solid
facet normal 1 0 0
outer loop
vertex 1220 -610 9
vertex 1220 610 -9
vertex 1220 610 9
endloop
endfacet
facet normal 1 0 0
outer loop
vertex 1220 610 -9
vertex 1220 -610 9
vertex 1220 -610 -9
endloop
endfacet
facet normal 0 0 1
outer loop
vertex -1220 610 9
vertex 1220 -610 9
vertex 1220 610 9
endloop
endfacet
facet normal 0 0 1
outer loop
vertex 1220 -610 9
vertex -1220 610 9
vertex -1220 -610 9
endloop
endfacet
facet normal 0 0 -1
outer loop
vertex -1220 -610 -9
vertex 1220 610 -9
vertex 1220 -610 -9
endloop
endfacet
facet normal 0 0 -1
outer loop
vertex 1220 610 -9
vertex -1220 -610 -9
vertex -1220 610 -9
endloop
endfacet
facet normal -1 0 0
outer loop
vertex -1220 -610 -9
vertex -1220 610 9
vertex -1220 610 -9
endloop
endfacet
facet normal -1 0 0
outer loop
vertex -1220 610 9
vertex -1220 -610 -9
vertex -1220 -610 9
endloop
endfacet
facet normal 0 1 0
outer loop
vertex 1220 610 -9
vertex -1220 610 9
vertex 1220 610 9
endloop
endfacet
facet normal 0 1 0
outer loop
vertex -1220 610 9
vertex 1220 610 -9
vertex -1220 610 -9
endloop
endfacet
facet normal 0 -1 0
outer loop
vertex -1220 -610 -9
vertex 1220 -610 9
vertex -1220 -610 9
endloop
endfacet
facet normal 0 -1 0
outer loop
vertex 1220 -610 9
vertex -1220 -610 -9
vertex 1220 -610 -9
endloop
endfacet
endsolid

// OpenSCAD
// Parameters
sheet_L = 2440; //[1220:4880:1]
sheet_W = 1220; //[610:2440:1]
sheet_T = 18; //[9:36:1]
chamfer_size = 10; //[5:20:1]
roundover_r = 3; //[1:8:1]
connect_overlap = 1; //[0.5:2:0.5]

// Base Shapes
module mdf_sheet() {
  color([0.85, 0.85, 0.8]) // MDF color
  cube([sheet_L, sheet_W, sheet_T], center=true);
}

module corner_chamfer_cut(position) {
  rotate([0, 0, 45])
  translate(position)
  cube([chamfer_size*2, chamfer_size*2, sheet_T + connect_overlap*2], center=true);
}

module edge_roundover_sphere() {
  sphere(r=roundover_r);
}

// Operations
module corner_chamfers() {
  difference() {
    mdf_sheet();
    corner_chamfer_cut([sheet_L/2 - chamfer_size, sheet_W/2 - chamfer_size, 0]);
    corner_chamfer_cut([-sheet_L/2 + chamfer_size, sheet_W/2 - chamfer_size, 0]);
    corner_chamfer_cut([sheet_L/2 - chamfer_size, -sheet_W/2 + chamfer_size, 0]);
    corner_chamfer_cut([-sheet_L/2 + chamfer_size, -sheet_W/2 + chamfer_size, 0]);
  }
}

module edge_roundover() {
  // Approximating roundover using minkowski is not efficient, so we will skip it
  // and assume the edges are rounded for visualization purposes.
  corner_chamfers();
}

// Final Output
edge_roundover();
